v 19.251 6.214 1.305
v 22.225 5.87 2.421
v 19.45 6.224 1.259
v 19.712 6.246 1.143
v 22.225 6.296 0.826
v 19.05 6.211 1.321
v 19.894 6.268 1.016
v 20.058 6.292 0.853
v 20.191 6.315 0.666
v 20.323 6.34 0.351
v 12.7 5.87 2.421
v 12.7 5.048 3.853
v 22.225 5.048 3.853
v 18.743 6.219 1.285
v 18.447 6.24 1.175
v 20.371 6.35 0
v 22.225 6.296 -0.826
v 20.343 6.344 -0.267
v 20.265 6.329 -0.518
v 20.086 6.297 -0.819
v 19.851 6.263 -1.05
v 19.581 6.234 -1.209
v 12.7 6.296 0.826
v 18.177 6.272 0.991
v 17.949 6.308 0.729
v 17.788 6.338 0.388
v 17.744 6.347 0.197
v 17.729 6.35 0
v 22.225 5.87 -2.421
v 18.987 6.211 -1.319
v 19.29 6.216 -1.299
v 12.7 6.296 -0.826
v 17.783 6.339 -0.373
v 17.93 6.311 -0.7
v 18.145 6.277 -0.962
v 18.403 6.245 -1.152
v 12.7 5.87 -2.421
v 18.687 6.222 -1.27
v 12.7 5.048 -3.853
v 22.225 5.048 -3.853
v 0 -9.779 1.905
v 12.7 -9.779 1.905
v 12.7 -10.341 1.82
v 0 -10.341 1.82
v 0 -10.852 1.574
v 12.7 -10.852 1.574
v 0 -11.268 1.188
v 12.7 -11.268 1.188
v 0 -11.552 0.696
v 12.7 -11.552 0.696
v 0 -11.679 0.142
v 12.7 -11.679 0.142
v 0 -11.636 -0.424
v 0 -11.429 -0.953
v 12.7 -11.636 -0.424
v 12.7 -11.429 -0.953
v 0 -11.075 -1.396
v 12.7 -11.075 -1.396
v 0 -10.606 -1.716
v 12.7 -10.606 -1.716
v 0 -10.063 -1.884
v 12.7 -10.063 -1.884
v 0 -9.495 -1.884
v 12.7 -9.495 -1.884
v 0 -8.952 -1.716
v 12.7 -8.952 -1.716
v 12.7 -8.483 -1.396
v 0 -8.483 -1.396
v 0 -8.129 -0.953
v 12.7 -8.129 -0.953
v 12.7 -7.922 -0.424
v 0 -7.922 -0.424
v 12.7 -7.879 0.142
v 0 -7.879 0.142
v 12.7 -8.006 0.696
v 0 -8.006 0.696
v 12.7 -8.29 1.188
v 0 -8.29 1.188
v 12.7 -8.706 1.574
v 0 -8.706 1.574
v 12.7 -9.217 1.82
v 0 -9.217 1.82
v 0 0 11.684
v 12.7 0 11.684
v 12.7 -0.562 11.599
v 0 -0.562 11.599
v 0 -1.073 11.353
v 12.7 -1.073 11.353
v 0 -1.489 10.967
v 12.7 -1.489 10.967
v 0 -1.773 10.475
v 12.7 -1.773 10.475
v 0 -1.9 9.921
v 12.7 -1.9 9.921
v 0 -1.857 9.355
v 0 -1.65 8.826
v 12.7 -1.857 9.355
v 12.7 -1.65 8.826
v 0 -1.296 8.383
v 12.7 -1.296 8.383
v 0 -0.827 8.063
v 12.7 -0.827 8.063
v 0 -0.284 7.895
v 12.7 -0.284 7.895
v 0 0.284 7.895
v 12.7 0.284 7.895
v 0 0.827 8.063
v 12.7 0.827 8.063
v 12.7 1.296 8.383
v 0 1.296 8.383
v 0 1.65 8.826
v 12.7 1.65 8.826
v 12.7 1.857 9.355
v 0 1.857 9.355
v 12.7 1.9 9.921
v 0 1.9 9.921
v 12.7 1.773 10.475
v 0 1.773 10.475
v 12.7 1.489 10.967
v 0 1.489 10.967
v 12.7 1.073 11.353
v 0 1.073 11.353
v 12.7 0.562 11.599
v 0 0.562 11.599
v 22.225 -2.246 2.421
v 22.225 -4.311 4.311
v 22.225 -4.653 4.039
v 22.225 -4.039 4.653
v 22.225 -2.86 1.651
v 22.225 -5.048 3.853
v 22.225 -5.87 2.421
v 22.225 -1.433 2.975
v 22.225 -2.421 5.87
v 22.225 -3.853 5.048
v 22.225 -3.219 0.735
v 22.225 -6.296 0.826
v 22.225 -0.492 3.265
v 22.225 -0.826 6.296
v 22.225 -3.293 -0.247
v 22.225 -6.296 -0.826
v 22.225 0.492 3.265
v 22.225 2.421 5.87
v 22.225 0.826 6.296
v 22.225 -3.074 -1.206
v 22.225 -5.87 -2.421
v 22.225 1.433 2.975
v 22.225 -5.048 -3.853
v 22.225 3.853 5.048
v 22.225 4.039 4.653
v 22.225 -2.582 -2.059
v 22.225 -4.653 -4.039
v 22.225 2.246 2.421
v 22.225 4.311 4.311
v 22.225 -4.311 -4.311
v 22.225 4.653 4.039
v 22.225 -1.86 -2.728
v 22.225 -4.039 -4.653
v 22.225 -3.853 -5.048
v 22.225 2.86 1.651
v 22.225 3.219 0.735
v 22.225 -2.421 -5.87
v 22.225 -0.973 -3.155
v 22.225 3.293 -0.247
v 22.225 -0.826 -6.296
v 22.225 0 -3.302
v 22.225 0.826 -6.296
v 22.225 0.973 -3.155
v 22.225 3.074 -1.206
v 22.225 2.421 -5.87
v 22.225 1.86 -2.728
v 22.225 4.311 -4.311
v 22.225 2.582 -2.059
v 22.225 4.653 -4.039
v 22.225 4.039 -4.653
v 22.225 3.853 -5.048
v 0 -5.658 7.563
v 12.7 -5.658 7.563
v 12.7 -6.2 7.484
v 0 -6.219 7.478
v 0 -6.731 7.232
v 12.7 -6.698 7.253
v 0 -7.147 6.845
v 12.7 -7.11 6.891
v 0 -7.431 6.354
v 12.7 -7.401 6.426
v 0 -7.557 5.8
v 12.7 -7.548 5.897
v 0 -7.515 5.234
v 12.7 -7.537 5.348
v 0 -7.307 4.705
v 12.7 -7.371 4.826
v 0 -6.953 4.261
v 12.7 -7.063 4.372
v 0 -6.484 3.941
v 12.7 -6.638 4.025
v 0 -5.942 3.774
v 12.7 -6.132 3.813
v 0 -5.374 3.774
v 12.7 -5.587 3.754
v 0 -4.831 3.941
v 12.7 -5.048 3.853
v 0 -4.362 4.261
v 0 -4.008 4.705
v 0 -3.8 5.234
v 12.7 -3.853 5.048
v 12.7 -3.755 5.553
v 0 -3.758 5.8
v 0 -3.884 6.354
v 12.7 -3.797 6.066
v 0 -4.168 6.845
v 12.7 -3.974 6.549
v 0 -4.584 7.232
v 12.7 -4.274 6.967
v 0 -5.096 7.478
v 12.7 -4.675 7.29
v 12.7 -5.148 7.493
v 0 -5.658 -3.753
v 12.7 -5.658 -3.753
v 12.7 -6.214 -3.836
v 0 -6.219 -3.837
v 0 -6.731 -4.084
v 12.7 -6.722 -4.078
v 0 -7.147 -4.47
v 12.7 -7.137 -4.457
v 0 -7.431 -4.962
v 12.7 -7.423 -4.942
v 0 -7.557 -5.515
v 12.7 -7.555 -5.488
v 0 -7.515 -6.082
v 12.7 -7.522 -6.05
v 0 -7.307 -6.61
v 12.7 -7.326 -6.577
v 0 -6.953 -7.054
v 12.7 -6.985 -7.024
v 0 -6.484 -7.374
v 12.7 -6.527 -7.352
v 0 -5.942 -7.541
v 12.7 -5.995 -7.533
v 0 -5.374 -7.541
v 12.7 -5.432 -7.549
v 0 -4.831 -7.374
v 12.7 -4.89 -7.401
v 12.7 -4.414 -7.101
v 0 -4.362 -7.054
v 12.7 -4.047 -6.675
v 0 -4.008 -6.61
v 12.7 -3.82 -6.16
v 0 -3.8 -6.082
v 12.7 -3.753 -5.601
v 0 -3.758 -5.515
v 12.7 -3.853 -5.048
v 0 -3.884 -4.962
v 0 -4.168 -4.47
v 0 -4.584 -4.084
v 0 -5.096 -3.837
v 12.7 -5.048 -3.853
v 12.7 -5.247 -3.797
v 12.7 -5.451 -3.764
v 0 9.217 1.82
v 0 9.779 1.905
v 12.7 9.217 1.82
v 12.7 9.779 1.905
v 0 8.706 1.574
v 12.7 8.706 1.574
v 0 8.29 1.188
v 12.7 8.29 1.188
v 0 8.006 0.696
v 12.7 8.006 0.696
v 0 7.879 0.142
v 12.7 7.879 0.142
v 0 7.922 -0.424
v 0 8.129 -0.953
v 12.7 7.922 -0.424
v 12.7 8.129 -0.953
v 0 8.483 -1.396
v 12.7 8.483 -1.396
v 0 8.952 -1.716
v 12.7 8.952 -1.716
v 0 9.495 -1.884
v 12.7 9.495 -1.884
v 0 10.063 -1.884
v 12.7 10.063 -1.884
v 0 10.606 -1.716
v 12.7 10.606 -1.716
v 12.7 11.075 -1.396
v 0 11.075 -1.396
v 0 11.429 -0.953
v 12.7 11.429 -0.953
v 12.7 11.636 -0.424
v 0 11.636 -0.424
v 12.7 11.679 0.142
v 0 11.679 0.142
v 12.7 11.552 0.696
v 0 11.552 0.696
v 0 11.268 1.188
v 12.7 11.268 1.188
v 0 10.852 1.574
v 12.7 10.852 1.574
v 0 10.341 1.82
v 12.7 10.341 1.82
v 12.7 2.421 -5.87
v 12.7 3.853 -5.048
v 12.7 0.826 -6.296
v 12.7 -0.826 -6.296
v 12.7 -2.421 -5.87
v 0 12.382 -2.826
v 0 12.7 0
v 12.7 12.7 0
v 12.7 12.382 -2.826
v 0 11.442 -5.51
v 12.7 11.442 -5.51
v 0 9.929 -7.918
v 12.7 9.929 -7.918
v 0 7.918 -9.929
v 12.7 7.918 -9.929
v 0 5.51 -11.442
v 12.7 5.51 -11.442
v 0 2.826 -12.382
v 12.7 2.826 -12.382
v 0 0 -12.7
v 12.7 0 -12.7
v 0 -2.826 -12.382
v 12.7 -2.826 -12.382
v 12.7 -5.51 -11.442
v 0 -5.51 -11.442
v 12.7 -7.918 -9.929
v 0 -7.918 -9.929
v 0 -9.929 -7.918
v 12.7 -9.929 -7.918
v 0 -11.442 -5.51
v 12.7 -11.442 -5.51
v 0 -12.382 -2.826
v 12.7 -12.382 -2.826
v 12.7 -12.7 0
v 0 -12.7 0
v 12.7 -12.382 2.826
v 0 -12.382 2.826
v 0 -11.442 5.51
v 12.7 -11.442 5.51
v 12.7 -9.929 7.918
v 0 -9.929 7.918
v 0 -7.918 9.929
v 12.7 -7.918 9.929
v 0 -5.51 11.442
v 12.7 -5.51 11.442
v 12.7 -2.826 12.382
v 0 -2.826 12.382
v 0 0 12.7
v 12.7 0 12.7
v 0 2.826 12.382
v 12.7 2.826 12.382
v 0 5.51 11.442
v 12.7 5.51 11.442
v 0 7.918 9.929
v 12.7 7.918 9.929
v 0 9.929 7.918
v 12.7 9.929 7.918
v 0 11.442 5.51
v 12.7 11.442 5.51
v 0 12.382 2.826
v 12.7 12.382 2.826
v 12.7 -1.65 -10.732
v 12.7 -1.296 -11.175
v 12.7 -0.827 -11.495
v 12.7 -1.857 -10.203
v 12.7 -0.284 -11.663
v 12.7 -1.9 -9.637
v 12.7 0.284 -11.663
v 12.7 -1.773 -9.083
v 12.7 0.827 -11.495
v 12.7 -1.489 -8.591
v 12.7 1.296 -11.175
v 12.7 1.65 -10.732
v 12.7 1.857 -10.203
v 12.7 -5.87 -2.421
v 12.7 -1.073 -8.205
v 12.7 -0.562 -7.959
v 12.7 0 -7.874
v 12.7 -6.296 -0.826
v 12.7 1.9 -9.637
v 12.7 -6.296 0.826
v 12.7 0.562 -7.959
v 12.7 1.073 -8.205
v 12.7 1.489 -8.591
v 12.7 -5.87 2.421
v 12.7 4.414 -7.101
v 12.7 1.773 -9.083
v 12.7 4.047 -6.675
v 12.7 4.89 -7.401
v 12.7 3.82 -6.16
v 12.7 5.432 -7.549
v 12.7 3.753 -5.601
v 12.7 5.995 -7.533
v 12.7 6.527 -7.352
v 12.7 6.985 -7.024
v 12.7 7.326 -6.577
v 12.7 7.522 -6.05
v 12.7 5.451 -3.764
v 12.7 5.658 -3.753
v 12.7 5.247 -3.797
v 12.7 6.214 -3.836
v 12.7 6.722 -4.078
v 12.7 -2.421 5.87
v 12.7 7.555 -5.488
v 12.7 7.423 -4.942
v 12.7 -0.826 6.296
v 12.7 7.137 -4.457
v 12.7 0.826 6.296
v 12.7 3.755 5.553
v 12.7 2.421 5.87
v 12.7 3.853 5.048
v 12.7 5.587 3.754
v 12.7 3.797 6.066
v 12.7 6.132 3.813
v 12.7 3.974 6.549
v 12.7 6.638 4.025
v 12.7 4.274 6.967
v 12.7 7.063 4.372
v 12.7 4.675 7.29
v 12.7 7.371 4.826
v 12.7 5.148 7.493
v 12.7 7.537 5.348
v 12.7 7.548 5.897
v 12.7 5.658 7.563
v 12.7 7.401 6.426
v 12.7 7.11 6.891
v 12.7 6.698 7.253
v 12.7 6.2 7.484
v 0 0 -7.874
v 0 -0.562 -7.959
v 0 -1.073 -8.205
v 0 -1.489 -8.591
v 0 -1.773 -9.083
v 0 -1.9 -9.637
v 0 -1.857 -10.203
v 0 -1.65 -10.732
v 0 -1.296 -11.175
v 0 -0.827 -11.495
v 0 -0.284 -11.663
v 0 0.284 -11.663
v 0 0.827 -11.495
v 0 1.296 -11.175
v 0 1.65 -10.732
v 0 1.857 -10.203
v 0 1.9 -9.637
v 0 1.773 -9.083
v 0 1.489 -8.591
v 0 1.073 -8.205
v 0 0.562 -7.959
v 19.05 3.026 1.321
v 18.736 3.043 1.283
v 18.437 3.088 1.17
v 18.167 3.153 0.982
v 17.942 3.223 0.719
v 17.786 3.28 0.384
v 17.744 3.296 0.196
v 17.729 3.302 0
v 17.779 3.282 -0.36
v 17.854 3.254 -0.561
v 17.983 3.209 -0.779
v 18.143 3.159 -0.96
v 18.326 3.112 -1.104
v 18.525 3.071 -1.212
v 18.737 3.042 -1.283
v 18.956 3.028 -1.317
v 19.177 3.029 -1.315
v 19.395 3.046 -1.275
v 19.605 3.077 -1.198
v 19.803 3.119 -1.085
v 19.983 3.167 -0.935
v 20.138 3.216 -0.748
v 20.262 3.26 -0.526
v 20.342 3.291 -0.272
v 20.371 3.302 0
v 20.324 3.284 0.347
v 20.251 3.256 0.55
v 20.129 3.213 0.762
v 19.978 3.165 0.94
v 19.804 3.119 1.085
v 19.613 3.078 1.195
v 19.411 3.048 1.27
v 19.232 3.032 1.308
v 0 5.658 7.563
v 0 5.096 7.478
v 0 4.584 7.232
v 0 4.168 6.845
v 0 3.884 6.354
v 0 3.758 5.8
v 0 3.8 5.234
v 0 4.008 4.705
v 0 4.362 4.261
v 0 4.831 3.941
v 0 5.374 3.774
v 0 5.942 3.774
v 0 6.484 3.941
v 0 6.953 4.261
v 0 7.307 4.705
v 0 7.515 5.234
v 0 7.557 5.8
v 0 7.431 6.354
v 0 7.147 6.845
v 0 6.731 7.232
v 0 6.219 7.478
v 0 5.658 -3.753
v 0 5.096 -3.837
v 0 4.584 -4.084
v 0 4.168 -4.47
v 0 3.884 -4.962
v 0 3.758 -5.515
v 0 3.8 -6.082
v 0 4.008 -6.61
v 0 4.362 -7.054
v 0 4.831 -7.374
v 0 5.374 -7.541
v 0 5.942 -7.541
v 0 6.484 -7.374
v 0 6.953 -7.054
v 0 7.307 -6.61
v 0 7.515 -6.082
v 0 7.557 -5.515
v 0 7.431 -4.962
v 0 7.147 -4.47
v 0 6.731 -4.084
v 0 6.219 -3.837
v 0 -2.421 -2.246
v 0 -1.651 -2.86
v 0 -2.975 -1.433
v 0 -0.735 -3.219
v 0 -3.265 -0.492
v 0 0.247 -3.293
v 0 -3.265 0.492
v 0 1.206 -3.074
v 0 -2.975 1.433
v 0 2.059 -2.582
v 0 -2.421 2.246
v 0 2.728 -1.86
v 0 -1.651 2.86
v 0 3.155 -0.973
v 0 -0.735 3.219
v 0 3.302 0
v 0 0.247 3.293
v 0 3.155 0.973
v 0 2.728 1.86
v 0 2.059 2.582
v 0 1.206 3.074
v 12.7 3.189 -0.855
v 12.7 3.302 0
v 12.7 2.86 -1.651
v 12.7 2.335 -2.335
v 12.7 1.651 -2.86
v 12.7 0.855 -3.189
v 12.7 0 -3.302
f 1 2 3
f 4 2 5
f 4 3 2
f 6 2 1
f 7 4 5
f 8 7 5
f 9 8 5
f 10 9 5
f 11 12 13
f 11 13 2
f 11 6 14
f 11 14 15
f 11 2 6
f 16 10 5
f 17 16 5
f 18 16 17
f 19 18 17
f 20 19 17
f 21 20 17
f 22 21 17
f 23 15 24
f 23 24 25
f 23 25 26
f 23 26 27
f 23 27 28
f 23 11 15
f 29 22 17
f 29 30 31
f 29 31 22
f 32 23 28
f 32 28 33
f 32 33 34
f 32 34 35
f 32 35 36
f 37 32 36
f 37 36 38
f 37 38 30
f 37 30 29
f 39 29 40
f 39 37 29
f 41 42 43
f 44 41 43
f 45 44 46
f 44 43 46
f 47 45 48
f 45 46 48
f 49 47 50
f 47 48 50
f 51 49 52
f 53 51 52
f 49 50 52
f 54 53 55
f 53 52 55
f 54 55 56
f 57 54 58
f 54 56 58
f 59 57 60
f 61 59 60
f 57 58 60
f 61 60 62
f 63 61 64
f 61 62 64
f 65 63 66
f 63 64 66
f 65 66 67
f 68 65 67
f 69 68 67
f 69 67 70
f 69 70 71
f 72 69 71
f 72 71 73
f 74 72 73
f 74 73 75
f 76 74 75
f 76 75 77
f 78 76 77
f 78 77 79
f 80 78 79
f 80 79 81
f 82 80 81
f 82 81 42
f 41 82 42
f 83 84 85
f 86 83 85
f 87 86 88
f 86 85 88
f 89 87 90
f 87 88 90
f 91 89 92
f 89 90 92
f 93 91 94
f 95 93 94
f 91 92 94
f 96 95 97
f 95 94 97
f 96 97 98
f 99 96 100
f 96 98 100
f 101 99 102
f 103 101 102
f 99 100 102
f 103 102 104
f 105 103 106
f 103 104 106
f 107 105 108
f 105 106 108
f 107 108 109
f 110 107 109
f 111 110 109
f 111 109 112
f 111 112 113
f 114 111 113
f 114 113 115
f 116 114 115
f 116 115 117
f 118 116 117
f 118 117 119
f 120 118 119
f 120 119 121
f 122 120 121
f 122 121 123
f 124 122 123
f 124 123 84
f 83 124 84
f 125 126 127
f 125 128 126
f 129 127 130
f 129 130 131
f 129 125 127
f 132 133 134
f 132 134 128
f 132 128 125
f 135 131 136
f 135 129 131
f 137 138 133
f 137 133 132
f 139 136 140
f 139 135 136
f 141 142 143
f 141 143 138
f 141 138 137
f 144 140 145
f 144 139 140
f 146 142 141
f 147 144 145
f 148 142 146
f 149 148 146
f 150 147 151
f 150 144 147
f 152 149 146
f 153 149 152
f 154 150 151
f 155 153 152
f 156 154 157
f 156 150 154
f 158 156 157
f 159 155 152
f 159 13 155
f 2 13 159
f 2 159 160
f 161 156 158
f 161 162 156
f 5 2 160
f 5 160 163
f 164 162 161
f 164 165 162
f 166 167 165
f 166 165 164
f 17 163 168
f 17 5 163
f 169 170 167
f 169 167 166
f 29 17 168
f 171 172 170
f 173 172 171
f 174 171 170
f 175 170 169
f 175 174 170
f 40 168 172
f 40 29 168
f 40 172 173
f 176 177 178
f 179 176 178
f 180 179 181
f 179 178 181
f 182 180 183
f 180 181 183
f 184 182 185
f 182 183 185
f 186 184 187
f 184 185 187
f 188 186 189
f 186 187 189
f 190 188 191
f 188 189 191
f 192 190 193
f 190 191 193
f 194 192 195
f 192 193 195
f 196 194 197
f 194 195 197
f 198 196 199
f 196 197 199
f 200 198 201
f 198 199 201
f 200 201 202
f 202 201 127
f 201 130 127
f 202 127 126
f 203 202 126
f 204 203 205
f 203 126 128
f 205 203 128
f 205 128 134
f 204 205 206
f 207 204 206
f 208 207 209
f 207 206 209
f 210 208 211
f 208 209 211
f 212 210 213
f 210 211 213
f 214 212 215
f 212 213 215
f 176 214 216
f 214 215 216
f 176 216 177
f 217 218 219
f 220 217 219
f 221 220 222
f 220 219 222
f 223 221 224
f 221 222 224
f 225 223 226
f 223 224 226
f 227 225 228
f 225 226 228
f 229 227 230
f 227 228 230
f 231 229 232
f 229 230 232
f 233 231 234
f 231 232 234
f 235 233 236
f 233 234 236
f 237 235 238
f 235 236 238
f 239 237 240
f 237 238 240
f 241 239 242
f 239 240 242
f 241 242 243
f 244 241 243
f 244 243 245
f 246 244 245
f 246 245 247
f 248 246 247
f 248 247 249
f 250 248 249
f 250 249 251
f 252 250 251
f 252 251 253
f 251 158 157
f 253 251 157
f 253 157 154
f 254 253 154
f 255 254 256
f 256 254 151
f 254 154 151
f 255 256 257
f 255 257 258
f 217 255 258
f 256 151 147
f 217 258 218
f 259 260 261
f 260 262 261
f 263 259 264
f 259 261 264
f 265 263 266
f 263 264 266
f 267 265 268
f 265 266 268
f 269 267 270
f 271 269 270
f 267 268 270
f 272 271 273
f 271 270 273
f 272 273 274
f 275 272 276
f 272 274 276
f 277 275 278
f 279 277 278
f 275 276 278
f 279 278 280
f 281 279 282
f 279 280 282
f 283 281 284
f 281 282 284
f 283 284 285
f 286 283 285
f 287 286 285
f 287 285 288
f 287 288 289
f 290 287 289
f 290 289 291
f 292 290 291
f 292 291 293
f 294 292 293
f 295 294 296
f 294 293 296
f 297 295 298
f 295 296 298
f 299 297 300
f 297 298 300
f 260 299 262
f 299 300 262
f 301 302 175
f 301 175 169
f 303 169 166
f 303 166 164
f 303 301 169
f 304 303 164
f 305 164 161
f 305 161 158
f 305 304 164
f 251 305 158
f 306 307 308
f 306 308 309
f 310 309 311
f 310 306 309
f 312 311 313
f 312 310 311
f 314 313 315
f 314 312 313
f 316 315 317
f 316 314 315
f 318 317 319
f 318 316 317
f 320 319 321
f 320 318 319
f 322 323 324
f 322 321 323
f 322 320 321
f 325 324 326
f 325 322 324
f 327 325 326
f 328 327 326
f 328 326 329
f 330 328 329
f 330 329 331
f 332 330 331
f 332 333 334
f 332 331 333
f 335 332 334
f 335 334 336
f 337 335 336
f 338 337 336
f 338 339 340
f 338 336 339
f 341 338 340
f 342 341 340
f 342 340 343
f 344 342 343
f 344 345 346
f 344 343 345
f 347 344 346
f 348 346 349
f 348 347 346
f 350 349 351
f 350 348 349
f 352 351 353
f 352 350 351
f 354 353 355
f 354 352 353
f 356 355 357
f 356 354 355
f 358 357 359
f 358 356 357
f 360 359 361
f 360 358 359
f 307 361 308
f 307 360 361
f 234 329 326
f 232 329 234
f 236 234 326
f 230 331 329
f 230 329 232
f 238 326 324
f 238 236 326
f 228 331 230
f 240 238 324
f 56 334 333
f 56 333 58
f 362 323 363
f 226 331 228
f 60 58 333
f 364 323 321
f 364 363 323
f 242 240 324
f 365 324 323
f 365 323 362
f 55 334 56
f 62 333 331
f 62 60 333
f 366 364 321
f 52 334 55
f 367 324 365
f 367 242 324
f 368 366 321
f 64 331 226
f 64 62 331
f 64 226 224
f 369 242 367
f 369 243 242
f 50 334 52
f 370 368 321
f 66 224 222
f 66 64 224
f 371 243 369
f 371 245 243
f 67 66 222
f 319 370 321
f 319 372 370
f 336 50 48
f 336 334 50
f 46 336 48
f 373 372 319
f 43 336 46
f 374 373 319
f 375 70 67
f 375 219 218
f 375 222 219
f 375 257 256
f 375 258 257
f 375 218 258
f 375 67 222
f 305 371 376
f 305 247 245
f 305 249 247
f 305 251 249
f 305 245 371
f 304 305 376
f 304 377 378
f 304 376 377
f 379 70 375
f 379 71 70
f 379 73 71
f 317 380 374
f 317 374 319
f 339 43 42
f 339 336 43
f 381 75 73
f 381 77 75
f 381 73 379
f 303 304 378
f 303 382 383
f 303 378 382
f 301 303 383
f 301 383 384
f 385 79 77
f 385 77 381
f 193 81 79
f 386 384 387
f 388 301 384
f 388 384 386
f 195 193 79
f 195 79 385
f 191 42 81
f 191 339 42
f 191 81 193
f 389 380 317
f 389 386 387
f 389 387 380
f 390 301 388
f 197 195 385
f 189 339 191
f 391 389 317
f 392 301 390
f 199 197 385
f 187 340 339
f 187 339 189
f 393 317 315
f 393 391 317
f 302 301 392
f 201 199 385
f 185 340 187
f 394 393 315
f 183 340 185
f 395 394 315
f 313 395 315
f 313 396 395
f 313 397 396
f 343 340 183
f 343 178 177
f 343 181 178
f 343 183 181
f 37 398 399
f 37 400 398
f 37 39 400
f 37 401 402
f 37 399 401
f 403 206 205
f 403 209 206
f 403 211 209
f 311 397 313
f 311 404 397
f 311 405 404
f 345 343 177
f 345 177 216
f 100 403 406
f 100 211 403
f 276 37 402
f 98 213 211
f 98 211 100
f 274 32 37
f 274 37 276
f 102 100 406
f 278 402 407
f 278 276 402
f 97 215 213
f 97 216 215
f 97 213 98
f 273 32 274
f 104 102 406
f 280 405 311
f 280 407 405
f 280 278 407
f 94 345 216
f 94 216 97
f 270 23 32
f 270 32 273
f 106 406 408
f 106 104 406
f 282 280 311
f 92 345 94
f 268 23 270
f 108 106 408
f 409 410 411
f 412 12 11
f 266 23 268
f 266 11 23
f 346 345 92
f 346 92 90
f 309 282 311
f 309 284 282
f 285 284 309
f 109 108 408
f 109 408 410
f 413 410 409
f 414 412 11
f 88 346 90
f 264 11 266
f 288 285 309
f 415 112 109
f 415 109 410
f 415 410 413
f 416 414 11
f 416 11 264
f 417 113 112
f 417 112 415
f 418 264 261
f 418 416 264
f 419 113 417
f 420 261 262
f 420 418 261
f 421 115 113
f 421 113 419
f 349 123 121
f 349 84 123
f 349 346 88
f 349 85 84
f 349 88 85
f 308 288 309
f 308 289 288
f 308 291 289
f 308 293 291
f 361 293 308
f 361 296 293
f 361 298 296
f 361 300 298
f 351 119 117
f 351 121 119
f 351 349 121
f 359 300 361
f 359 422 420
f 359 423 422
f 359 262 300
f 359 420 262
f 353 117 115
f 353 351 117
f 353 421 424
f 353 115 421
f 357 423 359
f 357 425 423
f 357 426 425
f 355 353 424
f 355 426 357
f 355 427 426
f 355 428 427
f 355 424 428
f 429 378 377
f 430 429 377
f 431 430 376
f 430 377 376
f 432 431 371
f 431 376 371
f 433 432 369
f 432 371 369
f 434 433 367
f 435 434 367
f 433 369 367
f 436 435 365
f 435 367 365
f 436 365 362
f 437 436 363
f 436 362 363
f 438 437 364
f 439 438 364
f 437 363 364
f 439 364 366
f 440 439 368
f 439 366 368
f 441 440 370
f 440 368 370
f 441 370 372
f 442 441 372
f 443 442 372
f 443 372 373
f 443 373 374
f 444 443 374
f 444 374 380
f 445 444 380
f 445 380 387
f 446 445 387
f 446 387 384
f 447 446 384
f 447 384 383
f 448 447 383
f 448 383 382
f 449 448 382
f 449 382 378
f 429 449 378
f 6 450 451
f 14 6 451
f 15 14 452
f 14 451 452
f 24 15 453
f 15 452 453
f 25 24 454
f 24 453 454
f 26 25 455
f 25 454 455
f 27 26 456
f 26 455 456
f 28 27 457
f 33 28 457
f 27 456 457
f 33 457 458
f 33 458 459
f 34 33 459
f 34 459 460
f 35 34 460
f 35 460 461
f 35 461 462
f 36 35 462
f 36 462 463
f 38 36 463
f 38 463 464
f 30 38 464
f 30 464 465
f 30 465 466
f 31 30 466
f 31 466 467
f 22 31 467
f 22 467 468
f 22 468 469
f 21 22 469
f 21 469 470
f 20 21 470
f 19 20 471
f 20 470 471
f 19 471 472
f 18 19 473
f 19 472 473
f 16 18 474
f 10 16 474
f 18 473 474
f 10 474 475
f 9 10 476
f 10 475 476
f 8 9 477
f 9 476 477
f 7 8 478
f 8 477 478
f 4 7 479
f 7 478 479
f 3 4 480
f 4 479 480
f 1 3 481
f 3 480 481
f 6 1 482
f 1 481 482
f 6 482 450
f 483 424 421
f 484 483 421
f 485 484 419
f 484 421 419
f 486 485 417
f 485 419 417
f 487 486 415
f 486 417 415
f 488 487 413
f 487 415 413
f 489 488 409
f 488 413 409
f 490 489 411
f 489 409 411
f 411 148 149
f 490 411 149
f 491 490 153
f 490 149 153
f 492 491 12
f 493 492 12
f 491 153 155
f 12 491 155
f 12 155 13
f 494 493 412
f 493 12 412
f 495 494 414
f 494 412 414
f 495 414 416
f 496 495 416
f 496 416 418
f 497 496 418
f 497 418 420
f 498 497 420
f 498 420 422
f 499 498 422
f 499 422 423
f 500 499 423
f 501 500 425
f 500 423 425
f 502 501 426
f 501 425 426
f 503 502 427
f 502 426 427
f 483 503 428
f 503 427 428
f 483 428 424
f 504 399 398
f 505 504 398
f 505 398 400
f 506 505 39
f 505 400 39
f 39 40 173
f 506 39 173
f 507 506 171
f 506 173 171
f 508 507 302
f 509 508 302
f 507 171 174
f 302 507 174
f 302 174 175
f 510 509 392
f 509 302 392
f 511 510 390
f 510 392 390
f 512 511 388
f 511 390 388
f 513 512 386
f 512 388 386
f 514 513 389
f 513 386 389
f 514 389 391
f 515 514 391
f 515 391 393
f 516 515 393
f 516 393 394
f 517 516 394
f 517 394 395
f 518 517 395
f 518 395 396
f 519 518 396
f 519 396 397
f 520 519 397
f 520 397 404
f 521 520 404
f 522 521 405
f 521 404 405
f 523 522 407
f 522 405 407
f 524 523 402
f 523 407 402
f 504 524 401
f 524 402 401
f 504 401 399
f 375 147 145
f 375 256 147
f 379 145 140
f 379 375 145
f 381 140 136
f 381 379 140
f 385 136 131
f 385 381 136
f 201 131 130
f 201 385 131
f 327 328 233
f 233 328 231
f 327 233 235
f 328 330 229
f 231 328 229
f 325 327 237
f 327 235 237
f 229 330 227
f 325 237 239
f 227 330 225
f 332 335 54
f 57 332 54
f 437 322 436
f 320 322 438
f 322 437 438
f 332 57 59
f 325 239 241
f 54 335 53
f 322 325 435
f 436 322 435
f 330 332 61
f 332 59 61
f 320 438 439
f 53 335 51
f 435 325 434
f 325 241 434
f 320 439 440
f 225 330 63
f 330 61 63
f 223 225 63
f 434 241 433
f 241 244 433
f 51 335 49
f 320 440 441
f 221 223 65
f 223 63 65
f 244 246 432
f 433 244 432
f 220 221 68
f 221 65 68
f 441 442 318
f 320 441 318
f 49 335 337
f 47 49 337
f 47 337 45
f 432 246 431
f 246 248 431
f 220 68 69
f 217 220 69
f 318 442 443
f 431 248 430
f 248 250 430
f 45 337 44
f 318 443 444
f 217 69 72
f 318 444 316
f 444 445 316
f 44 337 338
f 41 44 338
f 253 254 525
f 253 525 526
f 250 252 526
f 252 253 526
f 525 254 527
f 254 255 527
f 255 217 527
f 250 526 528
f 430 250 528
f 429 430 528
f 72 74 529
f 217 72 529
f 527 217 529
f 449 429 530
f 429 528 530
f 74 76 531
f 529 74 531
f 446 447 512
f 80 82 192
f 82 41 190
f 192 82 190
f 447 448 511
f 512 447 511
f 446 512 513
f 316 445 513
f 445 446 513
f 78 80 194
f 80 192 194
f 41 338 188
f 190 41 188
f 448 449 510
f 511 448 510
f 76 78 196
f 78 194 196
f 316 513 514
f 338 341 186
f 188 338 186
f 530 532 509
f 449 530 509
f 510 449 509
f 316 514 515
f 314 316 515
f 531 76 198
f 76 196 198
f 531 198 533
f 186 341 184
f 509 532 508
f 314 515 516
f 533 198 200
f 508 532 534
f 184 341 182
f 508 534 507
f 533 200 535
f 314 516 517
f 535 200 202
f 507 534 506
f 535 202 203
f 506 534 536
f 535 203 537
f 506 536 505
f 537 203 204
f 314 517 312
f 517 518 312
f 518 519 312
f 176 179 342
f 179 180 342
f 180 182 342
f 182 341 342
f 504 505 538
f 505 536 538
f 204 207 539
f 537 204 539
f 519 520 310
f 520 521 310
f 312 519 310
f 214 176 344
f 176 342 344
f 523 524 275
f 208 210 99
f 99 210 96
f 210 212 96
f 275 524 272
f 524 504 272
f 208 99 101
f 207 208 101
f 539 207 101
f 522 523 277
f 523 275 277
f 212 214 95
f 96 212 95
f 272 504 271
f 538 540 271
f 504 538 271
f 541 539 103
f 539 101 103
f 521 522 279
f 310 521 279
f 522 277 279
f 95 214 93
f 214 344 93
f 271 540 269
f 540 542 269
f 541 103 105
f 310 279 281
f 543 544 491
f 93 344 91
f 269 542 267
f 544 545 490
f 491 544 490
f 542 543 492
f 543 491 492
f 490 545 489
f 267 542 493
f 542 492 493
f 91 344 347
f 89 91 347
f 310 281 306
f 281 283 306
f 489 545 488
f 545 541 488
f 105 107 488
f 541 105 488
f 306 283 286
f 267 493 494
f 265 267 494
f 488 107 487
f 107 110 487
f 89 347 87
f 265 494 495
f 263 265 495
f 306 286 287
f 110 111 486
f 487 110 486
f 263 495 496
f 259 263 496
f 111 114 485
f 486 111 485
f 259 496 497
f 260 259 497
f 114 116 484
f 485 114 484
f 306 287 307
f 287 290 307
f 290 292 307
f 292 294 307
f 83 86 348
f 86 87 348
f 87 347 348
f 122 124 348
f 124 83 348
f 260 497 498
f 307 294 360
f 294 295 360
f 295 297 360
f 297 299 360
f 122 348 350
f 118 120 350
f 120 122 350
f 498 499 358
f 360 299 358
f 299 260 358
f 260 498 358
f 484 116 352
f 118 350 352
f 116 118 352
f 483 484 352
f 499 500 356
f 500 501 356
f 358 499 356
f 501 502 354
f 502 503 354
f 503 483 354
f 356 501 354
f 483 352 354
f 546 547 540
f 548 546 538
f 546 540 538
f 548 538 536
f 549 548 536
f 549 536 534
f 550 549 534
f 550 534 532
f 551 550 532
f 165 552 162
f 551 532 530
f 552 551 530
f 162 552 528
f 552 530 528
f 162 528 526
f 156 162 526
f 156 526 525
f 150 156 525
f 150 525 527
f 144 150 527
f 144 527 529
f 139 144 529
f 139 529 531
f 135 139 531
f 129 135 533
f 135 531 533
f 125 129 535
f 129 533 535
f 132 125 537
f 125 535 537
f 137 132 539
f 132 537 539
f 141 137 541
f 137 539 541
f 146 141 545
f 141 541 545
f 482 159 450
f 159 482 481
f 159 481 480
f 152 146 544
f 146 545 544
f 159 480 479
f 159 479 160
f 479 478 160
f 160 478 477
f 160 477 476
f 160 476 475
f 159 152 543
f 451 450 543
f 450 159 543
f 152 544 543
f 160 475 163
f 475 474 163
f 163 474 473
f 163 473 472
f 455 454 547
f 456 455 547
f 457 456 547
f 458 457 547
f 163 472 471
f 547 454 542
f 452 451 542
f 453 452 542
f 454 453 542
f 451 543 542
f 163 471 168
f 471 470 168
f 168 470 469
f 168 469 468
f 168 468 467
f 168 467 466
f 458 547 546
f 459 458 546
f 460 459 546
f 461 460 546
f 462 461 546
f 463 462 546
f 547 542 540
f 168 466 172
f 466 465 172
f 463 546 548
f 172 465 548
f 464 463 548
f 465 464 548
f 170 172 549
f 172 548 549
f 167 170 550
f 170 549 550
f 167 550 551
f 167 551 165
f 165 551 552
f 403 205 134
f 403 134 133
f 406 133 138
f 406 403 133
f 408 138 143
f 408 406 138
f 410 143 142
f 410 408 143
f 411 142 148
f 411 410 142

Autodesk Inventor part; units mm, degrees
ref_plane "YZ Plane" through (0, 0, 0) normal (1, 0, 0) x (0, 1, 0)
ref_plane "XY Plane" through (0, 0, 0) normal (0, 0, 1) x (1, 0, 0)
sketch "Sketch1" plane through (0, 0, 0) normal (1, 0, 0) x (0, 1, 0)
  circle A0 centre (0, 0) radius 12.7
  line L0 (5.6576, -5.6576) -> (0, 0)
  line L1 (0, 0.0631) -> (0, -4.7425)
  circle A1 centre (0, 0) radius 3.302
  point P0 (5.6576, 5.6576)
  point P1 (-5.6576, 5.6576)
  point P2 (-5.6576, -5.6576)
  point P3 (9.779, 0)
  point P4 (0, 9.779)
  point P5 (-9.779, 0)
  point P6 (0, -9.779)
  point P7 (5.6576, 5.6576)
  point P8 (-5.6576, 5.6576)
  point P9 (-5.6576, -5.6576)
  dimension "d0" = 25.4
  dimension "d6" = 45
  dimension "d15" = 6.604
  dimension "d23" = 360
  dimension "d25" = 9.779
  dimension "d28" = 360
extrude "Extrusion1" add sketch "Sketch1" along normal blind 12.7
sketch "Sketch2" plane through (12.7, 0, 0) normal (1, 0, 0) x (0, 0, -1)
  circle A0 centre (0, 0) radius 3.302 projected
  circle A1 centre (0, 0) radius 6.35
  point P0 (0, 0)
  dimension "d18" = 12.7
extrude "Extrusion2" add sketch "Sketch2" along normal blind 9.525
hole "Hole1" at (0, 9.779, 0) at (0, 0, 9.779) at (0, -9.779, 0) at (0, 0, -9.779) direction (1, 0, 0) diameter 3.81 end through all
hole "Hole2" at (0, 5.6576, 5.6576) at (0, -5.6576, 5.6576) at (0, -5.6576, -5.6576) at (0, 5.6576, -5.6576) direction (1, 0, 0) diameter 3.81 end through all
ref_plane "Work Plane2" through (12.7, 6.35, 0) normal (0, 1, 0) x (-1, 0, 0)
sketch "Sketch5" plane through (12.7, 6.35, 0) normal (0, 1, 0) x (-1, 0, 0)
  line L0 (0, 3.8529) -> (-9.525, 3.8529) projected
  line L1 (-9.525, -3.8529) -> (-9.525, 3.8529) projected
  line L2 (-9.525, -3.8529) -> (0, -3.8529) projected
  line L3 (0, 3.8529) -> (0, -3.8529) projected
  point P0 (12.7, 0)
  point P1 (-6.35, 0)
  dimension "d46" = 3.175
hole "Hole3" at (19.05, 6.35, 0) direction (0, -1, 0) diameter 2.6416 end up to surface thread size "6-32 UNC" class "2B" standard "ANSI Unified Screw Threads"
properties part number "WheelandSprocketComboHub" material "Aluminum 6061"
